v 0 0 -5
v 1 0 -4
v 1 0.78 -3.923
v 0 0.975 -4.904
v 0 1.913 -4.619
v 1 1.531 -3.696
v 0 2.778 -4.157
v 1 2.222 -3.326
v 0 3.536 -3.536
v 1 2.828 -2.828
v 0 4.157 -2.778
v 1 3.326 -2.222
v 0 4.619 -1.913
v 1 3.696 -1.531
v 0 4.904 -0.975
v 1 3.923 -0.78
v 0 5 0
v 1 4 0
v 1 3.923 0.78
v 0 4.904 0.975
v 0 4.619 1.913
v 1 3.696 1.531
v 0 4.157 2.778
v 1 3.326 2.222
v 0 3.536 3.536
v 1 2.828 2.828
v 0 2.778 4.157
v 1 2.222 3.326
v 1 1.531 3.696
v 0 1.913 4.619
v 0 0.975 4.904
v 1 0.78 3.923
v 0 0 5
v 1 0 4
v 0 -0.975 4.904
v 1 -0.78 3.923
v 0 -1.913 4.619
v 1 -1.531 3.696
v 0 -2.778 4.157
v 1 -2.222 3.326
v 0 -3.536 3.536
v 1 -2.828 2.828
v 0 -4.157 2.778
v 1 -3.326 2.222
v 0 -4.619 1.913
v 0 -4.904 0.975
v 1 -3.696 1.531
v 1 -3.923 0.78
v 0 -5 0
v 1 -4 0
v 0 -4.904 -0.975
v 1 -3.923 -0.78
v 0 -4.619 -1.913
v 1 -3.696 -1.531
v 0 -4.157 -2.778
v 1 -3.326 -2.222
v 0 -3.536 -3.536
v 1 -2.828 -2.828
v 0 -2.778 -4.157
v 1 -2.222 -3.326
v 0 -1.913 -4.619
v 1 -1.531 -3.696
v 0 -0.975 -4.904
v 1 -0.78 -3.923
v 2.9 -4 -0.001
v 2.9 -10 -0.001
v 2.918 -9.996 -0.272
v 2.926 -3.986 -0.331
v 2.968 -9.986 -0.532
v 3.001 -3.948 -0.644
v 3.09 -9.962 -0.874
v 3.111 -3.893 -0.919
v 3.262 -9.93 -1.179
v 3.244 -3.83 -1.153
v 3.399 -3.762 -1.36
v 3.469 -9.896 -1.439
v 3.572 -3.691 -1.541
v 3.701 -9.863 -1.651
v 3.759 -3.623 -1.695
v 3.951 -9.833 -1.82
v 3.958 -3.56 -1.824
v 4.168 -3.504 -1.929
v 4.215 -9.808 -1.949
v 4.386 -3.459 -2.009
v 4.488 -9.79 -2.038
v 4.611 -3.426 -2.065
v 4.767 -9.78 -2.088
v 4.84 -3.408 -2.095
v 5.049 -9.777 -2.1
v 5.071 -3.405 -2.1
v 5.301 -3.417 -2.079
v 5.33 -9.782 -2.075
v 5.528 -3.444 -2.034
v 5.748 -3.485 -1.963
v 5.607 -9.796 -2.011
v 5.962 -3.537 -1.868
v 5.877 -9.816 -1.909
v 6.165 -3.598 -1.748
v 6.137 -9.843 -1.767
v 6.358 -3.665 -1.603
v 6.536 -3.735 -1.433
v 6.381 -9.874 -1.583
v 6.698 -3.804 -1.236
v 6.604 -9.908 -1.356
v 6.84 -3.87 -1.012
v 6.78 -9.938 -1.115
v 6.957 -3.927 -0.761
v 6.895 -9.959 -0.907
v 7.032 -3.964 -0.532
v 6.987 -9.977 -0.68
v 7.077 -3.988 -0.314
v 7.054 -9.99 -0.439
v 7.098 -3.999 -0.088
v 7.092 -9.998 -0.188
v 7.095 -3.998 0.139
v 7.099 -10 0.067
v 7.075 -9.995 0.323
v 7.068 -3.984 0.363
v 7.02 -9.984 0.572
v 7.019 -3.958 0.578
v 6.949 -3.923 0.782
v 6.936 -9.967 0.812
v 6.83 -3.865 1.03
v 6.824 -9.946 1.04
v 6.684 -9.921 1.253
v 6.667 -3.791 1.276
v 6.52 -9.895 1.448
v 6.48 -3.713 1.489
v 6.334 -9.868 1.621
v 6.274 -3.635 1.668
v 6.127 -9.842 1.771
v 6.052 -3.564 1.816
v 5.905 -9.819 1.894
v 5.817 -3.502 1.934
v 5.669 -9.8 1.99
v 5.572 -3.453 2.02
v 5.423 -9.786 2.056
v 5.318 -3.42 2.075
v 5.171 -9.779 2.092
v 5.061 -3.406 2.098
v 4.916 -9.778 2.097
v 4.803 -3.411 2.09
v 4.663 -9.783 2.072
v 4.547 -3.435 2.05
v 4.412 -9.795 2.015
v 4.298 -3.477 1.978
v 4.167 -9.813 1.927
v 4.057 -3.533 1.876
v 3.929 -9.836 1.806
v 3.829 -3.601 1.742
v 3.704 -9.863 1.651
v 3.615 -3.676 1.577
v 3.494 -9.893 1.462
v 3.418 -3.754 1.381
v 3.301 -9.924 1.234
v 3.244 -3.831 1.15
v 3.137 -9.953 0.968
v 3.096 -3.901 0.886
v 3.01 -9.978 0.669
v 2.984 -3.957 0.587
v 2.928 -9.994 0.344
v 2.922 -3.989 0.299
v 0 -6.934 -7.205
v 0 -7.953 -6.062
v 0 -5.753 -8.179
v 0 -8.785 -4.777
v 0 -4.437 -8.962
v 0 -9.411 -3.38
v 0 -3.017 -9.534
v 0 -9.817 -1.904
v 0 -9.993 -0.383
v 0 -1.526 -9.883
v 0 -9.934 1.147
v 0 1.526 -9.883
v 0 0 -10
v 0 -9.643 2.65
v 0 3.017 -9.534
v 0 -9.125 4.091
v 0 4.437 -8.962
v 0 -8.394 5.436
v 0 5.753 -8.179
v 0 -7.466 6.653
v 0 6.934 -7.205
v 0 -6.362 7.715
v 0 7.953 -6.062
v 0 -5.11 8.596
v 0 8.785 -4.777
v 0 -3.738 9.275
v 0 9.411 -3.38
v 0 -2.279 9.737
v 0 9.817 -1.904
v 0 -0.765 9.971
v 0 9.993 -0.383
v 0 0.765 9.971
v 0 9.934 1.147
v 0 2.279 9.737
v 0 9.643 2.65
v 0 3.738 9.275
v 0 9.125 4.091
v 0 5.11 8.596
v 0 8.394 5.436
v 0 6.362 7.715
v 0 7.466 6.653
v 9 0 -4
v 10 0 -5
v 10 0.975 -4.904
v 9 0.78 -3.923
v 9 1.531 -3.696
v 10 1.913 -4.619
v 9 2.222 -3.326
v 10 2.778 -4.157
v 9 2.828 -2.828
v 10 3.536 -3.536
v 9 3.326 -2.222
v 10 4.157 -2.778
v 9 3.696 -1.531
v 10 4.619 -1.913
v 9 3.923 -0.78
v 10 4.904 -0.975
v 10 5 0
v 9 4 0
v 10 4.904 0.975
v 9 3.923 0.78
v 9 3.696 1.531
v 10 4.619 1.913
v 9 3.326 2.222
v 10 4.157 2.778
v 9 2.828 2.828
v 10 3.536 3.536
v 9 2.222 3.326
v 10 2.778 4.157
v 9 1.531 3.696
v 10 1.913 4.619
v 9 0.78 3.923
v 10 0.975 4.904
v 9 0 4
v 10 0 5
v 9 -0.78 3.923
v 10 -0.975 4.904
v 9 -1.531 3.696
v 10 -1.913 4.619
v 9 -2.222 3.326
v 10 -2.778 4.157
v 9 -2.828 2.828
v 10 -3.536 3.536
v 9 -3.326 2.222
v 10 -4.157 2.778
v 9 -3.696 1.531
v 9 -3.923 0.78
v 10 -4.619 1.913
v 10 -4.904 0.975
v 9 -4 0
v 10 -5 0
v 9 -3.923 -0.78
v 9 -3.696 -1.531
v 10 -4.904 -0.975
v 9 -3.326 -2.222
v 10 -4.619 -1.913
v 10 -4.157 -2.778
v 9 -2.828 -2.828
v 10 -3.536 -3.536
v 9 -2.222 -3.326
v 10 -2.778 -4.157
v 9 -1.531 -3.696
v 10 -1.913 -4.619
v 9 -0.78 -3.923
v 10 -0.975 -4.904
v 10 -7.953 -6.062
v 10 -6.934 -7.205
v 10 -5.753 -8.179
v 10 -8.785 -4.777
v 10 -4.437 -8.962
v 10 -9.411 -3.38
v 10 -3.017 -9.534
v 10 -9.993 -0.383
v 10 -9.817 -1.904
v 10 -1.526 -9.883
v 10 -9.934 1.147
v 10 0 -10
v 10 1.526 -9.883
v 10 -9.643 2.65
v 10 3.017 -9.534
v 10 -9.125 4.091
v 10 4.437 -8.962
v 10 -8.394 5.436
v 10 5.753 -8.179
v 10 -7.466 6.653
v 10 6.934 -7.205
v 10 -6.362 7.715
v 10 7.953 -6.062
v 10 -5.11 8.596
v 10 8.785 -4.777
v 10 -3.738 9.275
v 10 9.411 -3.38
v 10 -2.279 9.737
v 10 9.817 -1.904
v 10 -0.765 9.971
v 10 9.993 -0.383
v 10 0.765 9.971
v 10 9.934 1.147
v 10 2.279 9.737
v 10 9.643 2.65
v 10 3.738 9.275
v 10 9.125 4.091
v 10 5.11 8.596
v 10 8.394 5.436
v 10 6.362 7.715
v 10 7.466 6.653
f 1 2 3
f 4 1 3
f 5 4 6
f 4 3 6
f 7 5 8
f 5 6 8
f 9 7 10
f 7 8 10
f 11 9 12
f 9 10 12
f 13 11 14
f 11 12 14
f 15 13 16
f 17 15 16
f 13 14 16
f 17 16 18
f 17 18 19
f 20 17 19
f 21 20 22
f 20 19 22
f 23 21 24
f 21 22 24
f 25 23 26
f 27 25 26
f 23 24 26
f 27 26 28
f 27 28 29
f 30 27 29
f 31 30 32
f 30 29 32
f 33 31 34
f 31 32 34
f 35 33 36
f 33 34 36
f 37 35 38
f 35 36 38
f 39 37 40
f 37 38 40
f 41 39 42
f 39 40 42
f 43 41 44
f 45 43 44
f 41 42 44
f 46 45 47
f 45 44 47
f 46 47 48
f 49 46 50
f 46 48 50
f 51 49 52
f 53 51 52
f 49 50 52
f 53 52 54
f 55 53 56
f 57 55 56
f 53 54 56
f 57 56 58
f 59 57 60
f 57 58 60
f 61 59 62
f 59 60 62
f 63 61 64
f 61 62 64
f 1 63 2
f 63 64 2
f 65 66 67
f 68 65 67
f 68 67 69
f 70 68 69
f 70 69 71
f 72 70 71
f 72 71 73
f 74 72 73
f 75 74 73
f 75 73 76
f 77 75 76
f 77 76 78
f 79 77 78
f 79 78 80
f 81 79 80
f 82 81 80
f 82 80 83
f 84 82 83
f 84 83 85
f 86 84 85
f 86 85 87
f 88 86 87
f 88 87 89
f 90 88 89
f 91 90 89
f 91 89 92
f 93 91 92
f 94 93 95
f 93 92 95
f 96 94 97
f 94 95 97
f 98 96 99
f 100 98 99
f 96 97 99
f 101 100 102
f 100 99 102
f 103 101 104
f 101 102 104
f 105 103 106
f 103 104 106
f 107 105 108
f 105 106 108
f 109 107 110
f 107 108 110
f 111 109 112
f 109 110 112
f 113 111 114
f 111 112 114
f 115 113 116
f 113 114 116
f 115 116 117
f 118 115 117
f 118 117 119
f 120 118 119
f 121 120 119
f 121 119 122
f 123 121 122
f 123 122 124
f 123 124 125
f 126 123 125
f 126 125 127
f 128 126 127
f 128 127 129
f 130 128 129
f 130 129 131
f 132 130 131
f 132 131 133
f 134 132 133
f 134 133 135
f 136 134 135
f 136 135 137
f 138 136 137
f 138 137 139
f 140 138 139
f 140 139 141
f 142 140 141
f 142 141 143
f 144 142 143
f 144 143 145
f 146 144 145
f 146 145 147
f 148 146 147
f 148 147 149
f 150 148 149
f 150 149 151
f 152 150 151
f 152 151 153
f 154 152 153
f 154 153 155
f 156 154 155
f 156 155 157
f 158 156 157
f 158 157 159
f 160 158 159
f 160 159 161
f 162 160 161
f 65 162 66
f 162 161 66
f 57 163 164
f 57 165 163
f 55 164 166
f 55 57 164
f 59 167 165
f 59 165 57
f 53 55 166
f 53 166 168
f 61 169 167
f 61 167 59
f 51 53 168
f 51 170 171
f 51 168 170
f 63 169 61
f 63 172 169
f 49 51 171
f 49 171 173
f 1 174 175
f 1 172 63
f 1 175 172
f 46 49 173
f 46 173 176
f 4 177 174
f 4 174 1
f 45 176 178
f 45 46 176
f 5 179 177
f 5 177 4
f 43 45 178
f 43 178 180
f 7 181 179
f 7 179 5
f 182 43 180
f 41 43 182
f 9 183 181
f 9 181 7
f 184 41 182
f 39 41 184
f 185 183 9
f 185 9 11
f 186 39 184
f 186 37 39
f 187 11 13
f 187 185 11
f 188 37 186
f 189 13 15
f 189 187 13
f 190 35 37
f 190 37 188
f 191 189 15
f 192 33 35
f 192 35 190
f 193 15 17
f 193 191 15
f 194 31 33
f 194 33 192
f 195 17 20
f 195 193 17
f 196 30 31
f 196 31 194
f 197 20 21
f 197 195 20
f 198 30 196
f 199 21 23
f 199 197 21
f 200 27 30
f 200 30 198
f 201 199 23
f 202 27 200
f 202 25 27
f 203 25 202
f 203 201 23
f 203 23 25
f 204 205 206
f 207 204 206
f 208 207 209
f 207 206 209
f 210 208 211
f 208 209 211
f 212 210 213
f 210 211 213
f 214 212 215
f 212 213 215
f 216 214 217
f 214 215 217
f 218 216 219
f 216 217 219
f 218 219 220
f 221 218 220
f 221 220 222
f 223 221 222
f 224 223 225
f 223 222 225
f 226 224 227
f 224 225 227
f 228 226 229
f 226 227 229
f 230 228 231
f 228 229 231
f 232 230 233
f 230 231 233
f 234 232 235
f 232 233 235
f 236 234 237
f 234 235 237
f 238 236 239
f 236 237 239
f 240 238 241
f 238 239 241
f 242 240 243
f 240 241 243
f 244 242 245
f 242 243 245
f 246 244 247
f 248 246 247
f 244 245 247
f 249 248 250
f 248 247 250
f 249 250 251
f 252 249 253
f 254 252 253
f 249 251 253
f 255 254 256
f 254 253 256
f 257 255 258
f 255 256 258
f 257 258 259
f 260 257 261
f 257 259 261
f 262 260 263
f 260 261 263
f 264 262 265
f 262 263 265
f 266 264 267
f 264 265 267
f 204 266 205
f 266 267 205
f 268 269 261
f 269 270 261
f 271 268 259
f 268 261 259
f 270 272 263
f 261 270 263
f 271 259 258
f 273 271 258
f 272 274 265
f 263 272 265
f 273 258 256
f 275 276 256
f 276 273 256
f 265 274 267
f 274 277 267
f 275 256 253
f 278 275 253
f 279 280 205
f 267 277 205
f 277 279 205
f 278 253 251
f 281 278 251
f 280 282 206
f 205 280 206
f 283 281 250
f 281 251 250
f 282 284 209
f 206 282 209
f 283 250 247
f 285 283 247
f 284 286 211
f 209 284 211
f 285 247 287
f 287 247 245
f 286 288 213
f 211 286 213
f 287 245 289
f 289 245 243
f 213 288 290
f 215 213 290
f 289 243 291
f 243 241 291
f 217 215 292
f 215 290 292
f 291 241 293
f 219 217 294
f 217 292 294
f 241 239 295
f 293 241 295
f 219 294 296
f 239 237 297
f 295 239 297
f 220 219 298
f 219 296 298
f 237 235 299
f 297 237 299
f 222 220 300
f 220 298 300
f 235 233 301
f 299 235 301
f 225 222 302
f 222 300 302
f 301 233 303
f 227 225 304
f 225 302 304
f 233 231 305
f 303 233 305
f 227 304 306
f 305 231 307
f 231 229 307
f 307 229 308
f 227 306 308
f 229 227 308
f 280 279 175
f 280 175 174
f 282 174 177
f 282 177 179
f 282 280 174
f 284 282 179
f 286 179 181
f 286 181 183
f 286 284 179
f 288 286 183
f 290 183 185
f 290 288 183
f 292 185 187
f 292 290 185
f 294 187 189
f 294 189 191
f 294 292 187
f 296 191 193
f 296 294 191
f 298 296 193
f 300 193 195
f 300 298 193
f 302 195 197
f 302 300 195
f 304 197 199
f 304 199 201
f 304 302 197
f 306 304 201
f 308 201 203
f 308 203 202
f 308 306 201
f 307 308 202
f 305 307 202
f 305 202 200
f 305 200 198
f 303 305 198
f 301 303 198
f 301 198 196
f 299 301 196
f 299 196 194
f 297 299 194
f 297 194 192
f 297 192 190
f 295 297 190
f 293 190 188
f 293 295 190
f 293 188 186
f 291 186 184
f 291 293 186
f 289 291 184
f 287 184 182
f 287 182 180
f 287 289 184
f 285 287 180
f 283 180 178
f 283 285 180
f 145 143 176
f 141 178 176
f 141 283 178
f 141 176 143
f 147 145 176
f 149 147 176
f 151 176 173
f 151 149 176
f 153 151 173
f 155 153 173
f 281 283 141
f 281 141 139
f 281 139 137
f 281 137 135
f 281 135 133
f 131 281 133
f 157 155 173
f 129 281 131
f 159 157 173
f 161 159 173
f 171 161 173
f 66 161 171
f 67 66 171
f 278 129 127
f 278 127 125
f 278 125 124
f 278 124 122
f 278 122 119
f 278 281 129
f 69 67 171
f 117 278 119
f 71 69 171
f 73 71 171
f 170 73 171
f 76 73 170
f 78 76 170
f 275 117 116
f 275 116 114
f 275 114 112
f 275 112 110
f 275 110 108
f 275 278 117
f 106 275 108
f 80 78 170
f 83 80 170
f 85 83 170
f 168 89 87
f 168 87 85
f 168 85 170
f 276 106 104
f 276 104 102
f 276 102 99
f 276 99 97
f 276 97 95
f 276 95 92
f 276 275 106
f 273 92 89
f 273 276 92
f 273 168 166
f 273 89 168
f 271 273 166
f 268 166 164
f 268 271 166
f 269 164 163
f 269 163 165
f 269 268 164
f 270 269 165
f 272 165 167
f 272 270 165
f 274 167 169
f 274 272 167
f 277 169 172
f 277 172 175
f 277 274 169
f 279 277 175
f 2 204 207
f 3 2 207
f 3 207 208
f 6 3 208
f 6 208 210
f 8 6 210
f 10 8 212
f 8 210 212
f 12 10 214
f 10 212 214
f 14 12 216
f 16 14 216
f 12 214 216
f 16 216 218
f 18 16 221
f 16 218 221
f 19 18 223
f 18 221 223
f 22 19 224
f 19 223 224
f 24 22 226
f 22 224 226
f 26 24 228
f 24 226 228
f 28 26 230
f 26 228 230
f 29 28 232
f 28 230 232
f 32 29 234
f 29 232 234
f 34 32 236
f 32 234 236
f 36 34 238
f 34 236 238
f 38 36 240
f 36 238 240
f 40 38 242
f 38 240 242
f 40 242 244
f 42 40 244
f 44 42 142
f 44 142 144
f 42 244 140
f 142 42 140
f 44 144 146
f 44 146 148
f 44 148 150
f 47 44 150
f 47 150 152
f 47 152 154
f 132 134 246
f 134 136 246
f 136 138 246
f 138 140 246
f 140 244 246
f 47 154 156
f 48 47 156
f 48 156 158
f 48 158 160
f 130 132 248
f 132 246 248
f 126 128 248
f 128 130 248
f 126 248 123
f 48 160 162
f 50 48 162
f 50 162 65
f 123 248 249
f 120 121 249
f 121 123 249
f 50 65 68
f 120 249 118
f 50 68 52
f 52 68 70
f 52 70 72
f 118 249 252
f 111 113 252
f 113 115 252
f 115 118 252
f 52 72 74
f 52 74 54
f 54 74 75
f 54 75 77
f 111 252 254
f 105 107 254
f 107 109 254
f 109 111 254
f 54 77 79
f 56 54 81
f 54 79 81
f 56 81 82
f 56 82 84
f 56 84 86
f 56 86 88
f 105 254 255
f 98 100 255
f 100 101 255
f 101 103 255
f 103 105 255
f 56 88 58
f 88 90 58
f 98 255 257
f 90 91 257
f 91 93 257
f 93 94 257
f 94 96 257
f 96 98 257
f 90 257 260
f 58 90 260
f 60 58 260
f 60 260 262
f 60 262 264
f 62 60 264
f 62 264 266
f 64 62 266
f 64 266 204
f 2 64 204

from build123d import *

# Parameters (mm, degrees)
SKETCH1_W                 = 10
SKETCH1_H                 = 10
F_8_0_8_DIAMETER_HOLE1_D  = 8
M5X0_8_TAPPED_HOLE1_D     = 4.2
M5X0_8_TAPPED_HOLE1_DEPTH = 6.59617233
CHAMFER1_SIZE             = 1


with BuildPart() as part:
    # Sketch1 → Revolve1 (revolve)
    with BuildSketch(Plane.XY, mode=Mode.PRIVATE) as revolve1_sk:
        with Locations((5, 5)):
            Rectangle(SKETCH1_W, SKETCH1_H)
    revolve(revolve1_sk.sketch.rotate(Axis((0, 0, 0), (1, 0, 0)), 270), axis=Axis((0, 0, 0), (1, 0, 0)))

    # Ø8.0 (8) Diameter Hole1 (through all)
    with Locations(Plane.ZY):
        with Locations((0, 0)):
            Hole(F_8_0_8_DIAMETER_HOLE1_D / 2)

    # M5x0.8 Tapped Hole1
    with Locations(Plane(origin=(0, -3.40382767, 0), x_dir=(1, 0, 0), z_dir=(0, 1, 0))):
        with Locations((5, 0.000941977)):
            Hole(M5X0_8_TAPPED_HOLE1_D / 2, depth=M5X0_8_TAPPED_HOLE1_DEPTH)

    # Chamfer1
    chamfer1_edges = [part.edges().sort_by_distance(p)[0] for p in [
        (0, 0, 4),
        (10, 0, 4),
    ]]
    chamfer(chamfer1_edges, length=CHAMFER1_SIZE)


solid = part.part
